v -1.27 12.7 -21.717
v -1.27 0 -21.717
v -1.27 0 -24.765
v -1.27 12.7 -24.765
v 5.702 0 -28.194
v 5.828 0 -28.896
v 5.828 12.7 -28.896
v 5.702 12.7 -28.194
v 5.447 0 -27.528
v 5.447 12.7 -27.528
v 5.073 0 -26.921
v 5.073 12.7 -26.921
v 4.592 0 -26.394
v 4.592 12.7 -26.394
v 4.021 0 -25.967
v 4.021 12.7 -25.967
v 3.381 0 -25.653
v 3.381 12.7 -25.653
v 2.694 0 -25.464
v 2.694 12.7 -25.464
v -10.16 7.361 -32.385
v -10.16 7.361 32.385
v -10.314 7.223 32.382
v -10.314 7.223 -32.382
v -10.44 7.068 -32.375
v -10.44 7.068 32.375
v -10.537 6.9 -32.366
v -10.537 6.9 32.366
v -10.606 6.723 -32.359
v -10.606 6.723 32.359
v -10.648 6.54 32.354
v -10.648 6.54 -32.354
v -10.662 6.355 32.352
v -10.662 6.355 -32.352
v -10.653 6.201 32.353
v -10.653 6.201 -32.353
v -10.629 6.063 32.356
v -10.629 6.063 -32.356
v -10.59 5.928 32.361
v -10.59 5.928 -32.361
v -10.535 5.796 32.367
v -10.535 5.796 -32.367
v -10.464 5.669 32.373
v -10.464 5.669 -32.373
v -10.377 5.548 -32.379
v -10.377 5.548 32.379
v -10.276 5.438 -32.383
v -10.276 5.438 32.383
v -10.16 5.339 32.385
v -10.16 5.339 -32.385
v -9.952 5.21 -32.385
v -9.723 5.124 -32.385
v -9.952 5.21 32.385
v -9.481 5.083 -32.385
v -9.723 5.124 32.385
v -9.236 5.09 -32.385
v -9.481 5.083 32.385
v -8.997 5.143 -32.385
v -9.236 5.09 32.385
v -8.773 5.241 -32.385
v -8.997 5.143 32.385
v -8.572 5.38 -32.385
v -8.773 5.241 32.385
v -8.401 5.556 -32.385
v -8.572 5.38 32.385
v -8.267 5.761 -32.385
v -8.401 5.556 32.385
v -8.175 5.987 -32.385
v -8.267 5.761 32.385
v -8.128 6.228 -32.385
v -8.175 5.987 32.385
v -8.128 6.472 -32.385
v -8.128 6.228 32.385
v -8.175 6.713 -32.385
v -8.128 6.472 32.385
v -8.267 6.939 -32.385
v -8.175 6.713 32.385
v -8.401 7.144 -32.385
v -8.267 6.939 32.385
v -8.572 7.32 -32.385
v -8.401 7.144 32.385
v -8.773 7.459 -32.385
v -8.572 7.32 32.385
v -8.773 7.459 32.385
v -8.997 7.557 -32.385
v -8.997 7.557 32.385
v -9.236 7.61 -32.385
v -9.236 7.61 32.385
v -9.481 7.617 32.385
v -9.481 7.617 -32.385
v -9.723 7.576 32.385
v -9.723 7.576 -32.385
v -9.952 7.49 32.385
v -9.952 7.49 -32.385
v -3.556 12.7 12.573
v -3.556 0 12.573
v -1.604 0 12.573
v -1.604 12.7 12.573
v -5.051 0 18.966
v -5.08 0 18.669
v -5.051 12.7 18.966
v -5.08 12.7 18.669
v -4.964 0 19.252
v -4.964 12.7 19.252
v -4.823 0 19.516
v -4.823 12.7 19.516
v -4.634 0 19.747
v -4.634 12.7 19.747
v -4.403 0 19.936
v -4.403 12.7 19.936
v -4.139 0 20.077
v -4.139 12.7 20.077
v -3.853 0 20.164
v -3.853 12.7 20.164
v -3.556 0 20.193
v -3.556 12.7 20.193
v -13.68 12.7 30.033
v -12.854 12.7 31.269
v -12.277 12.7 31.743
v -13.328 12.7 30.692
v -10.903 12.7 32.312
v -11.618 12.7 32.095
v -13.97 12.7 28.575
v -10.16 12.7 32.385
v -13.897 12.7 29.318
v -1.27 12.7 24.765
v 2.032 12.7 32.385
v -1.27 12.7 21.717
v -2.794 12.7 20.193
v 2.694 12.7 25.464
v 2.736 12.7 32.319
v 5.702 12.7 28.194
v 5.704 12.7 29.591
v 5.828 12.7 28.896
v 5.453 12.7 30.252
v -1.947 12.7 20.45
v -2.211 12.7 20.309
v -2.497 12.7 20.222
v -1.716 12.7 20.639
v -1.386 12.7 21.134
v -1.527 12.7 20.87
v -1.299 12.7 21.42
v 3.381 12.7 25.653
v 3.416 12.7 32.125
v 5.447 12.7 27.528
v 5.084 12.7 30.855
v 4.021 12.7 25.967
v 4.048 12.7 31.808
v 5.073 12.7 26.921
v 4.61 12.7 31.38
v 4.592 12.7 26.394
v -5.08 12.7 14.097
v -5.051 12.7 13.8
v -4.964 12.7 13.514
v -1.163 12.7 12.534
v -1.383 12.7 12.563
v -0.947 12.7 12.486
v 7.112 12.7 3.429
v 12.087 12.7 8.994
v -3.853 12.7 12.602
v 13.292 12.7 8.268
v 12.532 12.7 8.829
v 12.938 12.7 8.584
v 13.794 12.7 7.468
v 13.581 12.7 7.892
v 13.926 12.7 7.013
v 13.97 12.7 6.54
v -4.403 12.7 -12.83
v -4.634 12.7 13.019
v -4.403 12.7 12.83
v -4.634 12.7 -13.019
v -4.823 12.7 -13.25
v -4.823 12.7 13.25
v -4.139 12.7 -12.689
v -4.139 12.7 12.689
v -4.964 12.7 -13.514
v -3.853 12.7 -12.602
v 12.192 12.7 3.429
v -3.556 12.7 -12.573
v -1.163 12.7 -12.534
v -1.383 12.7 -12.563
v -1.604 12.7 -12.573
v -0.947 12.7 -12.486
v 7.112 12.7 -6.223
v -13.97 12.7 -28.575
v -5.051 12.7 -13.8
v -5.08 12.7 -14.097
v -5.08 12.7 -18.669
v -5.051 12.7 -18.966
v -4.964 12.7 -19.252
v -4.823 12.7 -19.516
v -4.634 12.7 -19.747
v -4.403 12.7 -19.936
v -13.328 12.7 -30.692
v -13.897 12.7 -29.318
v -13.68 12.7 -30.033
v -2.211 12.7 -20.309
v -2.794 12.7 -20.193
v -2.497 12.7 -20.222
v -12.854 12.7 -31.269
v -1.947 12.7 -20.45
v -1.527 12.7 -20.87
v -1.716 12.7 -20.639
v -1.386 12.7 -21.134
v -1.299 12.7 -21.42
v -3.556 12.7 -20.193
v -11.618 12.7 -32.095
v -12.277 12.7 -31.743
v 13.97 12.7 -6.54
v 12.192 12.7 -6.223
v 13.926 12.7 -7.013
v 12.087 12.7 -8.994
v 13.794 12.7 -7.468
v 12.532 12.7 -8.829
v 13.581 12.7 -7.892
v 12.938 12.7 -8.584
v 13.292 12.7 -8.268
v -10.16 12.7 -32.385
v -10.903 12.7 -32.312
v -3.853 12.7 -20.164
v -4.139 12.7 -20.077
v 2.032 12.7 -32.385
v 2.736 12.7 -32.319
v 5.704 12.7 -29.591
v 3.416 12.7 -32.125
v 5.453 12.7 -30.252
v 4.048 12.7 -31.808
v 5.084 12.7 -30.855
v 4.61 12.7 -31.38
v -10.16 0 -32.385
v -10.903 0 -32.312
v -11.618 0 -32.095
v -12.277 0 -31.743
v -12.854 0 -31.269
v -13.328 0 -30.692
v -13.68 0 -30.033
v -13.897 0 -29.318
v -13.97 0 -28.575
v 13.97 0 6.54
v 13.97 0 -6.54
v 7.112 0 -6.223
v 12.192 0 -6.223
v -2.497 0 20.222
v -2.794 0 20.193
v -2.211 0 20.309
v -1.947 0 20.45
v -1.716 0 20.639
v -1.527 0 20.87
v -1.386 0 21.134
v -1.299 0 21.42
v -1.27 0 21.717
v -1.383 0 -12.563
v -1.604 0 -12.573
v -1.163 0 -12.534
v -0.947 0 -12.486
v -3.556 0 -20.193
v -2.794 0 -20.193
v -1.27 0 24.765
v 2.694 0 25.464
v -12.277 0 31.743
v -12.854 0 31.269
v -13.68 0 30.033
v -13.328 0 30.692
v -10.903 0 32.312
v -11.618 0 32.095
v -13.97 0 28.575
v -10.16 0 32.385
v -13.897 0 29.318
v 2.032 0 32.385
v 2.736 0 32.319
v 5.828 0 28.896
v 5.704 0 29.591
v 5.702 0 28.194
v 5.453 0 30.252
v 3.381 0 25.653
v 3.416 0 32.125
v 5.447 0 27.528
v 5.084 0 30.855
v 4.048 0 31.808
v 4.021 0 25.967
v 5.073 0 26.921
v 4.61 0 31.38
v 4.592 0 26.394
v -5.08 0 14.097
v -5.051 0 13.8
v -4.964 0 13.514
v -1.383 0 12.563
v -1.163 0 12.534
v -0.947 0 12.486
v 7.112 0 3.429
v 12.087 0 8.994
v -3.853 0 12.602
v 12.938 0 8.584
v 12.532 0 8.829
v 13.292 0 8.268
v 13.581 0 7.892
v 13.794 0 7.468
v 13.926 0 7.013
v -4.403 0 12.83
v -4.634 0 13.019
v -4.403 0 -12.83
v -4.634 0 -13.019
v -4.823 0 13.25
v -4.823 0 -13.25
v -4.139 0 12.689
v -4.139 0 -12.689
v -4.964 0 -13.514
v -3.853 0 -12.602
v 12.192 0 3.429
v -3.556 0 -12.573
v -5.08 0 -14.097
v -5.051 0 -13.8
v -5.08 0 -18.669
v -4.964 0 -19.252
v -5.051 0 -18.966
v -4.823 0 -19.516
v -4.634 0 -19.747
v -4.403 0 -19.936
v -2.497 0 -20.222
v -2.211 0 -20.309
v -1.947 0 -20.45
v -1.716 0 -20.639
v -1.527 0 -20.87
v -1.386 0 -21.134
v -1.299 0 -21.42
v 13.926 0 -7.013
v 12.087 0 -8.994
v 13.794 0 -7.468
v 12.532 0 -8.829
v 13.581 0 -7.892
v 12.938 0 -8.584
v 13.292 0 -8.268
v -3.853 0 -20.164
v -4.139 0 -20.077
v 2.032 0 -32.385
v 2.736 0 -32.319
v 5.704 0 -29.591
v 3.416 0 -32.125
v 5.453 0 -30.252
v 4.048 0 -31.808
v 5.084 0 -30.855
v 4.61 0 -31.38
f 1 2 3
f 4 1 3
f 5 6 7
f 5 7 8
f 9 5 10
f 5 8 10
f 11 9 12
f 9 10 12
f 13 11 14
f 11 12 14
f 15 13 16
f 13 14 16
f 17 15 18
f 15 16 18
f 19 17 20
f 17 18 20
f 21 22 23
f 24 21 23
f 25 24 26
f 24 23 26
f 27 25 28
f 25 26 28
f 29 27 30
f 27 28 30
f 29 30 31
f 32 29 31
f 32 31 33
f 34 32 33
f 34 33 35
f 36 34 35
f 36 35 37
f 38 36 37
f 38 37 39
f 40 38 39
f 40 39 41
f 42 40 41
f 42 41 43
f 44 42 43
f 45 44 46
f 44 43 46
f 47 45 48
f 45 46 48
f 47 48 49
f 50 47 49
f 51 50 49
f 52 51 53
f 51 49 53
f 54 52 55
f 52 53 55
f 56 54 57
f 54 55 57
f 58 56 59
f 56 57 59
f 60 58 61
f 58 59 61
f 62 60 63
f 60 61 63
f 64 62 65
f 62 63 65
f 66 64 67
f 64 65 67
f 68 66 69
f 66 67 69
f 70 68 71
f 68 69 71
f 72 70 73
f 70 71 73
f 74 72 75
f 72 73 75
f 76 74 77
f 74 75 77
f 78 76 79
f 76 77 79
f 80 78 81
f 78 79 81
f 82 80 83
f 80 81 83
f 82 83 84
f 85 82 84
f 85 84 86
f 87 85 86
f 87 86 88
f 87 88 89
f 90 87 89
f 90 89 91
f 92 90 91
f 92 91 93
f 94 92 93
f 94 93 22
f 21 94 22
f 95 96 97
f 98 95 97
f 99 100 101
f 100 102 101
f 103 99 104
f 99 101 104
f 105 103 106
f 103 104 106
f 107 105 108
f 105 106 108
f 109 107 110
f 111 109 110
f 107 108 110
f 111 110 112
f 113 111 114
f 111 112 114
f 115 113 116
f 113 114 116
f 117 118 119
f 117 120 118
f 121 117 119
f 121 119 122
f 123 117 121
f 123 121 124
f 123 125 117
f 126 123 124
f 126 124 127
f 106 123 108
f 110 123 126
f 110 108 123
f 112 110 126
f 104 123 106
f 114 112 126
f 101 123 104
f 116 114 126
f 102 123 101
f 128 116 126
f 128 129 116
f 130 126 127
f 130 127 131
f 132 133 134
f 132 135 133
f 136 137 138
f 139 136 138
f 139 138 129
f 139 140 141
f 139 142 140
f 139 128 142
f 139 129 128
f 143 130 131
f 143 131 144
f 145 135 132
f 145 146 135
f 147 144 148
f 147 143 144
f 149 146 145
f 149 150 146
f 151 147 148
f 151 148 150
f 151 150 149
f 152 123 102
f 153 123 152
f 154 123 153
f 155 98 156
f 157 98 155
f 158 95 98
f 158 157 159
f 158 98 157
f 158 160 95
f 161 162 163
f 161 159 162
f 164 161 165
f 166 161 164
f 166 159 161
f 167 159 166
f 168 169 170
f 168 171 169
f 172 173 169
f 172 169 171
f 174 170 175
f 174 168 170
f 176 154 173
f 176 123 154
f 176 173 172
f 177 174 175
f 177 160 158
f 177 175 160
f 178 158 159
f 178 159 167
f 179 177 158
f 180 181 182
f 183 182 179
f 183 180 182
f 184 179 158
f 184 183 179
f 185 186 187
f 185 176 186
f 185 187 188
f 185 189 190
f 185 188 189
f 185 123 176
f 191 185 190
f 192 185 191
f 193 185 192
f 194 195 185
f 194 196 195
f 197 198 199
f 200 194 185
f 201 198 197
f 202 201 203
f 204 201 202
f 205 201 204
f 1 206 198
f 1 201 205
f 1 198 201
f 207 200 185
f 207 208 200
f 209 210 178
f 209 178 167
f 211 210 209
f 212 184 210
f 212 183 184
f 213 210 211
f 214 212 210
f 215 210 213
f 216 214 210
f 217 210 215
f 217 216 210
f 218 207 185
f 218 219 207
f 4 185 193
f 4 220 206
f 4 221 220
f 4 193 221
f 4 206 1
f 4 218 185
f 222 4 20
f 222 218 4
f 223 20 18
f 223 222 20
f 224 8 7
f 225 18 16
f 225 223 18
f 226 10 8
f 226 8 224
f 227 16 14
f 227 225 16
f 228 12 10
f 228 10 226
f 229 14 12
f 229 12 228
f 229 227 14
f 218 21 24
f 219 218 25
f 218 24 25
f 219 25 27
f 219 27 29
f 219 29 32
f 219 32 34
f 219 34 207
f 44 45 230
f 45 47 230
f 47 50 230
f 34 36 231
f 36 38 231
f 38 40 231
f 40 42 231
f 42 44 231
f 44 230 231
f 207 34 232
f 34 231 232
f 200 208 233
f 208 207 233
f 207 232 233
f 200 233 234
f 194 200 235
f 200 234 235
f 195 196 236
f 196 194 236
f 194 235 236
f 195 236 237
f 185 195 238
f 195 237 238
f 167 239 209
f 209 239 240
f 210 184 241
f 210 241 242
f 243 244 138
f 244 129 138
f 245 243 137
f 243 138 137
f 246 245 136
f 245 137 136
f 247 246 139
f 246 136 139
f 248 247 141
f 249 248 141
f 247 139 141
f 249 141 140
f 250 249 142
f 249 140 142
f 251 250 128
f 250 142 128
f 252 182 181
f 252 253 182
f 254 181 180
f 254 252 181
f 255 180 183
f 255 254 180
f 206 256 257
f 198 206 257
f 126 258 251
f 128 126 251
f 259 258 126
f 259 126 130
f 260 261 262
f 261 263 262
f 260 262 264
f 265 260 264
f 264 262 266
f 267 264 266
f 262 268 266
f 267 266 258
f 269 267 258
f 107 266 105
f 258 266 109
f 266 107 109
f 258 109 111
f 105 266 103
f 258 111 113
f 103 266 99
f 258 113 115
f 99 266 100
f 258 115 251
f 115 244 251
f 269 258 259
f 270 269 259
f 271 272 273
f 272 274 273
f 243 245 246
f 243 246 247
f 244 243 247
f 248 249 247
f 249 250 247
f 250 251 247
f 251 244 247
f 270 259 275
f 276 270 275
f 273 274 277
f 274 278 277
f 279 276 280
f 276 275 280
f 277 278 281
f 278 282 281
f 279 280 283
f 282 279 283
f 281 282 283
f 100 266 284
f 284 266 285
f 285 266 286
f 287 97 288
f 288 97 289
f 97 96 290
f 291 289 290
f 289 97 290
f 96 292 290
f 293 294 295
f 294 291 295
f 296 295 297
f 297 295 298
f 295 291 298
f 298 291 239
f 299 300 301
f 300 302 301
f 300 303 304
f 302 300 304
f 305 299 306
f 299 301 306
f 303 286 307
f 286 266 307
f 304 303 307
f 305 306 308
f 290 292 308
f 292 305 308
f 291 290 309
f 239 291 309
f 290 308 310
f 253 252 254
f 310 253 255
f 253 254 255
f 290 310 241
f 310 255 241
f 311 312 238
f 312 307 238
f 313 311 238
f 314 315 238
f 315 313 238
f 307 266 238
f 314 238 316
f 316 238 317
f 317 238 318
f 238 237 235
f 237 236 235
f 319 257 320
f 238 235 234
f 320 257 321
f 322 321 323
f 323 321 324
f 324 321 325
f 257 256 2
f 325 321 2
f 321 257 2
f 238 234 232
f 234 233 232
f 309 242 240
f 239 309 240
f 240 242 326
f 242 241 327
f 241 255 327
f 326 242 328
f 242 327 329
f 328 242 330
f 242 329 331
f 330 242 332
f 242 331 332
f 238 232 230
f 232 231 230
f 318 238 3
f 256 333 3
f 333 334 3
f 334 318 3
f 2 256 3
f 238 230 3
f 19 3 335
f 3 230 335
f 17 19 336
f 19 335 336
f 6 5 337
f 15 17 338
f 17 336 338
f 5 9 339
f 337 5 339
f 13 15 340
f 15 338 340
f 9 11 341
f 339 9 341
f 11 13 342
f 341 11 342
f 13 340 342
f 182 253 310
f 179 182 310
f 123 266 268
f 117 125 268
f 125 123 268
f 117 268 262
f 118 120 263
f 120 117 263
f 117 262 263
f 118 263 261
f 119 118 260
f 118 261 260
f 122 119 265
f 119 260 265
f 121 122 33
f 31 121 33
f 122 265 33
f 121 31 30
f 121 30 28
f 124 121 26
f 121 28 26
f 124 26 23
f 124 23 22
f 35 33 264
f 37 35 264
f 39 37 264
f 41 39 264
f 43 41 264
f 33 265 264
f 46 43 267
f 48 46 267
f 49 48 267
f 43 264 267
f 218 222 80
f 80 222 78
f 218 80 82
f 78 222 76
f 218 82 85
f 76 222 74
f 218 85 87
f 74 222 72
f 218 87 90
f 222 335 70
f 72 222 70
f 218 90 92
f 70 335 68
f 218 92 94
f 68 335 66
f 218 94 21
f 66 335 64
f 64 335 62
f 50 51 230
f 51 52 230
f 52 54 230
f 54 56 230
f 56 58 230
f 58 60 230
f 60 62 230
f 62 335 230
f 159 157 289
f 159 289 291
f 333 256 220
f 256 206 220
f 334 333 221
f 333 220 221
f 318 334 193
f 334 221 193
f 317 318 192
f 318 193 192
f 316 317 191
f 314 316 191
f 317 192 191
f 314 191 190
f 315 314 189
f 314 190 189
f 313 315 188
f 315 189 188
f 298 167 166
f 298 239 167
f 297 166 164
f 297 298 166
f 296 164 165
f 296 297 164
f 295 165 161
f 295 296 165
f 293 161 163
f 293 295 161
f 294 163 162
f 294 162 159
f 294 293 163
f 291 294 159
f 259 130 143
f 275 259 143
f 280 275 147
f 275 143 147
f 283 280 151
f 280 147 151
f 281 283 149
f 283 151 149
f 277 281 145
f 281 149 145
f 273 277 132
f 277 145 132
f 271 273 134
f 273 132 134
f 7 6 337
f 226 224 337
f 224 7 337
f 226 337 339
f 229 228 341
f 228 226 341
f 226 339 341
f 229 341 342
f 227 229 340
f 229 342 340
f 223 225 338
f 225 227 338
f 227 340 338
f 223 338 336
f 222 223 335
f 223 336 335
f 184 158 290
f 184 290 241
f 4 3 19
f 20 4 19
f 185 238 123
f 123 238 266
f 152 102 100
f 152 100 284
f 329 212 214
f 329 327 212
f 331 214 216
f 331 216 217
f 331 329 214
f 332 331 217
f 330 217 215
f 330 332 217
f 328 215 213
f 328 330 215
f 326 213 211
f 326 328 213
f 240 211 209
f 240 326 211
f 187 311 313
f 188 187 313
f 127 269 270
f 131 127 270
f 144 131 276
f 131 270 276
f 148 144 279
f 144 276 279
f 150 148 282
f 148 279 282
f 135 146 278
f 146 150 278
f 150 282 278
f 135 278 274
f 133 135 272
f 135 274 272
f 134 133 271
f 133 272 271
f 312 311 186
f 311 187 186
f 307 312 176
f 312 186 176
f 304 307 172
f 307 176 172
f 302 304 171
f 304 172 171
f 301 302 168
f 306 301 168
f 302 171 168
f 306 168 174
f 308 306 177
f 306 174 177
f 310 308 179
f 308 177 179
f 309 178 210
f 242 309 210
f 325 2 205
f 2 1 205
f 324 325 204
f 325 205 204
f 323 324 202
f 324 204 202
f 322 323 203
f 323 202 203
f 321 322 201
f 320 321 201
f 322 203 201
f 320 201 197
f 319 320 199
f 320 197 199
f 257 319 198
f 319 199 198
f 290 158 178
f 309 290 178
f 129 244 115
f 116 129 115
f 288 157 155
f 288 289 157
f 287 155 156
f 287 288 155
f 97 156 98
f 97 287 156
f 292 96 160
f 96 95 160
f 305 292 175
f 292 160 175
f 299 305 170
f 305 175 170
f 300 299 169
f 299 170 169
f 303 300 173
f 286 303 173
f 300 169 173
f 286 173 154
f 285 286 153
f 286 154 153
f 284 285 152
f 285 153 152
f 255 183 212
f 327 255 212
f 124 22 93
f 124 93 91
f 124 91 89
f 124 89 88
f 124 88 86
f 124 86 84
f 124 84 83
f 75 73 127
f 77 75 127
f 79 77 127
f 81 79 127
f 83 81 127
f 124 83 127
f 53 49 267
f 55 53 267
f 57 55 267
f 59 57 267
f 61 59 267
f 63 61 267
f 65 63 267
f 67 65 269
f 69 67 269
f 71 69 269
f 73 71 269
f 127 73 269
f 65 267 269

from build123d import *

# Parameters (mm, degrees)
BOSS_EXTRUDE1_DEPTH = 12.7
CUT_EXTRUDE1_DEPTH  = 38.486519244
FILLET4_R           = 1.524
FILLET5_R           = 3.81
SKETCH3_R           = 1.27
CUT_EXTRUDE2_DEPTH  = 68.465574925
SKETCH4_W           = 5.08
SKETCH4_H           = 9.652
CUT_EXTRUDE3_DEPTH  = 38.486519401
FILLET6_R           = 2.54


with BuildPart() as part:
    # Sketch1 → Boss-Extrude1 (new body)
    with BuildSketch(Plane(origin=(0, 0, 0), x_dir=(1, 0, 0), z_dir=(0, 1, 0))):
        Polygon((5.842, 32.385), (-13.97, 32.385), (-13.97, -32.385), (5.842, -32.385), (5.842, -24.765), (-1.27, -24.765), (-1.27, -20.193), (-5.08, -20.193), (-5.08, -12.573), (-1.27, -12.573), (5.842, -12.573), (13.97, -12.573), (13.97, 12.573), (5.842, 12.573), (-1.27, 12.573), (-5.08, 12.573), (-5.08, 20.193), (-1.27, 20.193), (-1.27, 24.765), (5.842, 24.765), align=None)
    extrude(amount=BOSS_EXTRUDE1_DEPTH)

    # Sketch2 → Cut-Extrude1 (cut, through all)
    with BuildSketch(Plane(origin=(0, 12.7, 0), x_dir=(1, 0, 0), z_dir=(0, 1, 0))):
        Polygon((-1.27, 24.765), (5.842, 26.019037487), (5.842, 24.765), align=None)
        Polygon((-1.27, -24.765), (5.842, -26.019037487), (5.842, -24.765), align=None)
        Polygon((-1.27, 12.573), (13.97, 8.489454307), (13.97, 12.573), align=None)
        Polygon((-1.27, -12.573), (13.97, -8.489454307), (13.97, -12.573), align=None)
    extrude(amount=-CUT_EXTRUDE1_DEPTH, mode=Mode.SUBTRACT)

    # Fillet4
    fillet4_edges = [part.edges().sort_by_distance(p)[0] for p in [
        (-5.08, 6.35, 20.193),
        (-1.27, 6.35, 20.193),
        (-1.27, 6.35, -20.193),
        (-5.08, 6.35, -20.193),
        (-5.08, 6.35, -12.573),
        (-5.08, 6.35, 12.573),
    ]]
    fillet(fillet4_edges, radius=FILLET4_R)

    # Fillet5
    # the kernel refuses this fillet: 3.81 mm, written as the material it takes off along each edge
    with BuildSketch(Plane(origin=(-13.97, -9.525, 32.385), x_dir=(0, 0, -1), z_dir=(0, 1, 0)), Plane(origin=(-13.97, -9.525, -32.385), x_dir=(1, 0, 0), z_dir=(0, 1, 0)), Plane(origin=(5.842, -9.525, -32.385), x_dir=(0, 0, 1), z_dir=(0, 1, 0)), Plane(origin=(5.842, -9.525, 32.385), x_dir=(-1, 0, 0), z_dir=(0, 1, 0))) as fillet5_piece_1:
        with BuildLine():
            CenterArc((FILLET5_R, -FILLET5_R), FILLET5_R, 90, 90)
            Line((0, -FILLET5_R), (0, 0))
            Line((0, 0), (FILLET5_R, 0))
        make_face()
    extrude(amount=31.75, mode=Mode.SUBTRACT)
    with BuildSketch(Plane(origin=(5.842, 20.692423987, -26.019037487), x_dir=(-0.9848077530122095, 0, 0.17364817766692292), z_dir=(0, -1, 0)), Plane(origin=(5.842, 20.692423987, 26.019037487), x_dir=(0, 0, 1), z_dir=(0, -1, 0))) as fillet5_piece_2:
        with BuildLine():
            CenterArc((FILLET5_R * 0.839099631177, FILLET5_R), FILLET5_R, 190, 80)
            Line((-FILLET5_R * 0.145708121835, FILLET5_R * 0.826351822333), (0, 0))
            Line((0, 0), (FILLET5_R * 0.839099631177, 0))
        make_face()
    extrude(amount=28.684847974, mode=Mode.SUBTRACT)

    # Sketch3 → Cut-Extrude2 (cut, through all)
    with BuildSketch(Plane.XY.offset(32.385)):
        with Locations(Location((-9.391956596, 6.35, 0), (0, 0, 127.211471896))):
            Circle(SKETCH3_R)
    extrude(amount=-CUT_EXTRUDE2_DEPTH, mode=Mode.SUBTRACT)

    # Sketch4 → Cut-Extrude3 (cut, through all)
    with BuildSketch(Plane(origin=(0, 12.7, 0), x_dir=(1, 0, 0), z_dir=(0, 1, 0))):
        with Locations((9.652, 1.397)):
            Rectangle(SKETCH4_W, SKETCH4_H)
    extrude(amount=-CUT_EXTRUDE3_DEPTH, mode=Mode.SUBTRACT)

    # Fillet6
    fillet6_edges = [part.edges().sort_by_distance(p)[0] for p in [
        (-1.27, 6.35, 12.573),
        (13.97, 6.35, 8.489454307),
        (-1.27, 6.35, -12.573),
        (13.97, 6.35, -8.489454307),
    ]]
    fillet(fillet6_edges, radius=FILLET6_R)


solid = part.part
